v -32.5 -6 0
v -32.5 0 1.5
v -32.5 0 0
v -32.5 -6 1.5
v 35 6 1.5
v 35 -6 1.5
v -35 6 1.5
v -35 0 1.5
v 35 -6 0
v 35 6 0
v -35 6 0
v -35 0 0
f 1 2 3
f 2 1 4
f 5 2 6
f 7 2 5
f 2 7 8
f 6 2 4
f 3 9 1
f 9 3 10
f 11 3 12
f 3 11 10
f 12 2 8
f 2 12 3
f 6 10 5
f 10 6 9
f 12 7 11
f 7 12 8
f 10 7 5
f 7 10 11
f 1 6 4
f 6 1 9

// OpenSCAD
// Built by bench/smallmodels/features/compiler.py from a list of features.
$fn = 64;
difference() {
  union() {
    translate([0, 0, 0]) translate([-35, -6, 0]) cube([70, 12, 1.5]);
  }
  union() {
    translate([-35, -6, 0]) rotate([0, 0, 0]) translate([-2.5, -6, 0]) cube([5, 12, 1.5]);
    translate([-35, -6, 0]) rotate([0, 0, 0]) translate([-2.5, -6, 0]) cube([5, 12, 1.5]);
    translate([-35, -6, 0]) rotate([0, 0, 0]) translate([-2.5, -6, 0]) cube([5, 12, 1.5]);
    translate([-35, -6, 0]) rotate([0, 0, 0]) translate([-2.5, -6, 0]) cube([5, 12, 1.5]);
    translate([-35, -6, 0]) rotate([0, 0, 0]) translate([-2.5, -6, 0]) cube([5, 12, 1.5]);
    translate([-35, -6, 0]) rotate([0, 0, 0]) translate([-2.5, -6, 0]) cube([5, 12, 1.5]);
    translate([-35, -6, 0]) rotate([0, 0, 0]) translate([-2.5, -6, 0]) cube([5, 12, 1.5]);
    translate([-35, -6, 0]) rotate([0, 0, 0]) translate([-2.5, -6, 0]) cube([5, 12, 1.5]);
    translate([-35, -6, 0]) rotate([0, 0, 0]) translate([-2.5, -6, 0]) cube([5, 12, 1.5]);
    translate([-35, -6, 0]) rotate([0, 0, 0]) translate([-2.5, -6, 0]) cube([5, 12, 1.5]);
  }
}
